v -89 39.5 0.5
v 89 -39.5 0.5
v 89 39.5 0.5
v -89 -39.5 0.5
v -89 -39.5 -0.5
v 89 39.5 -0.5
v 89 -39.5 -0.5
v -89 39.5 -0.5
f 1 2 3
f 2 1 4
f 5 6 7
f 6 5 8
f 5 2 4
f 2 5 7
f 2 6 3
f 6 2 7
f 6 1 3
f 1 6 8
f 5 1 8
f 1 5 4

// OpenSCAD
// -*-C-*-
// Modules for various hardware connectors.
//
// Copyright 2013, Brian Davis
//
// License: LGPL 2.1 or later

$fn=0;
$fa=0.01;
$fs=0.9;

/*
 * Perforated, galvanized thin angle; available from Home Depot.
 */
module galvanized_angle_1(length=180, odd_holes=true) {
  color("gray")
  difference() {
    union() {
      translate([0, 0, -15.5])
        cube([32, length, 1], center=true);
      translate([-15.5, 0, 0])
        cube([1, length, 32], center=true);
    }
    union() {
      for (y_offset = [0 : 25.5 : length / 2]) {
        for (y_mult = [-1 : 2 : 1]) {
          if (odd_holes) {
            // Odd number of perforations, with one hole
            // centered at 0.
            translate([0, y_mult * y_offset, -15.5])
              cylinder(r=5, h=1.5, center=true);
            translate([-15.5, y_mult * y_offset, 0])
              rotate([0, 90, 0])
                cylinder(r=5, h=1.5, center=true);
          }
          else {
            // Even number of perforations, with 0 point
            // centered between 2 holes.
            translate([0, (y_mult * y_offset) + 12.25, -15.5])
              cylinder(r=5, h=1.5, center=true);
            translate([-15.5, (y_mult * y_offset) + 12.25, 0])
              rotate([0, 90, 0])
                cylinder(r=5, h=1.5, center=true);
          }
        }
      }
      if (!odd_holes) {
        // Add an extra hole in the -y direction.
        translate([0, (-length / 2) + 12.25, -15.5])
          cylinder(r=5, h=1.5, center=true);
        translate([-15.5, (-length / 2) + 12.25, 0])
          rotate([0, 90, 0])
            cylinder(r=5, h=1.5, center=true);
      }
    }
  }
}

/*
 * Generally used for square wooden posts; available from
 * Home Depot.
 */
module galvanized_connector_1() {
  color("gray")
  difference() {
    union() {
      translate([0, 0, 29.25])
        cube([93, 83, 1.5], center=true);
      for (x_mult = [-1 : 2 : 1]) {
        translate([x_mult * 46.5, 0, 0])
          cube([1.5, 83, 60], center=true);
      }
    }
    union() {
      translate([0, 0, 29.25])
        cylinder(r=7.25, h=1.7, center=true);
      for (x_mult = [-1 : 2 : 1]) {
        for (y_mult = [-1 : 2 : 1]) {
          translate([x_mult * 22.5, y_mult * 22.5, 29.25])
            cylinder(r=2.5, h=1.7, center=true);
          translate([x_mult * 46.5, y_mult * 22.5, -22])
            rotate([0, 90, 0])
              cylinder(r=2.5, h=1.7, center=true);
        }
        translate([x_mult * 46.5, 0, -10])
          rotate([0, 90, 0])
            cylinder(r=7.25, h=1.7, center=true);
        translate([x_mult * 46.5, 0, 8])
          rotate([0, 90, 0])
            cylinder(r=2.5, h=1.7, center=true);
      }
    }
  }
}

/*
 * Generally used for square wooden posts; available from
 * Home Depot.
 */
module galvanized_connector_2() {
  color("gray")
  difference() {
    union() {
      translate([0, 0, 45])
        cube([94, 40, 2], center=true);
      for (x_mult = [-1 : 2 : 1]) {
        translate([x_mult * 46.25, 0, 0])
          cube([1.5, 40, 90], center=true);
        translate([x_mult * 64.5, 0, -45])
          linear_extrude(height=2)
            polygon(points=[[x_mult * -17.5,20],[x_mult * 3.5,20],
                            [x_mult * 17.5,4.5],[x_mult * 17.5,-4.5],
                            [x_mult * 3.5,-20],[x_mult * -17.5,-20]],
                    paths=[[0,1,2,3,4,5]]);      
      }
    }
    union() {
      translate([0, 0, 45])
        cylinder(r=2, h=2.1, center=true);
      for (x_mult = [-1 : 2 : 1]) {
        translate([x_mult * 70.5, 0, -44])
          cylinder(r=5.5, h=2.1, center=true);
        translate([x_mult * 47.25, x_mult * -8.25, 17.25])
          rotate([0, 90, 0])
            cylinder(r=2, h=2.1, center=true);
        translate([x_mult * 47.25, x_mult * 10.25, -7.75])
          rotate([0, 90, 0])
            cylinder(r=2, h=2.1, center=true);
      }
    }
  }
}

/*
 * Used for 2" electrical conduit; available from Home Depot.
 */
module 2_inch_half_u_strap() {
  color("gray")
  translate([0, 20.25, -29.25])
    union() {
      translate([0, 0, 25])
        rotate([0, 270, 0])
          difference() {
            cylinder(r=33.5, h=28, center=true);
            union() {
              cylinder(r=30.75, h=28.2, center=true);
              translate([-20, 0, 0])
                cube([35, 70, 28.2], center=true);
            }
          }
      translate([0, -32.125, 12])
        cube([28, 3, 24], center=true);
      translate([0, -45.125, 1.5])
        difference() {
          cube([28, 29, 3], center=true);
          translate([0, -5, 0])
            cylinder(r=6, h=3.2, center=true);
        }
      translate([0, -60, 1.5])
        difference() {
          cylinder(r=14, h=3, center=true);
          translate([0, 16, 0])
            cube([30, 30, 3.2], center=true);
        }
      translate([-14, 30.625, 23])
        rotate([270, 0, 0])
          linear_extrude(height=3)
            polygon(points=[[0,0],[7,7],
                            [21,7],[28,0]],
                    paths=[[0,1,2,3]]);      
    }
}

/*
 * Thin strap designed for EMT conduit.
 * Halex product 96161; available from Home Depot.
 */
module half_inch_2_hole_strap() {
  color("gray")
  translate([0, 0, -1.25])
    union() {
      // Loop that goes over or under the conduit.
      rotate([0, 270, 0])
        difference() {
          cylinder(r=10.5, h=12.5, center=true);
          union() {
            cylinder(r=9, h=13, center=true);
            translate([-6, 0, 0])
              cube([12, 25, 13], center=true);
          }
        }
      // Attachment points
      for (y_mult = [-1 : 2 : 1]) {
        translate([0, y_mult * 9.75, -4])
          cube([12.5, 1.5, 8], center=true);
        translate([0, y_mult * 16.5, -7.625])
          difference() {
            cube([12.5, 12, 0.75], center=true);
            translate([0, y_mult * 3.5, 0])
              cylinder(r=2.5, h=1.25, center=true);
          }
        translate([0, y_mult * 24, -7.625])
          rotate([0, 0, 90 - (y_mult * 90)])
            translate([-6.5, -1.5, -0.375])
              linear_extrude(height=0.75)
                polygon(points=[[0,0],[3,3],
                                [10,3],[13,0]],
                        paths=[[0,1,2,3]]);      
      }
    }
}

/*
 * Another connector designed for electrical conduit and
 * available from Home Depot.
 */
module 2_inch_plastic_u_strap() {
  color("gray")
  union() {
    // Loop that goes over or under the conduit.
    rotate([90, 0, 0])
      difference() {
        union() {
          cylinder(r=33, h=19, center=true);
          translate([0, -16, 0])
            cube([66, 34, 19], center=true);
        }
        union() {
          cylinder(r=30, h=20, center=true);
          translate([0, -19, 0])
            cube([60, 34, 20], center=true);
        }
      }
    // Attachment points
    for (x_mult = [-1 : 2 : 1]) {
      translate([x_mult * 38.9, 0, -31])
        rotate([0, 90 - (x_mult * 90), 0])
          difference() {
            union() {
              cube([10, 19, 4], center=true);
              translate([-1.5, 0, 0])
                cylinder(r=11.5, h=4, center=true);
            }
            union() {
              translate([3, 0, 0])
                cylinder(r=4, h=4.5, center=true);
              for (y_mult = [-1 : 2 : 1]) {
                translate([0, y_mult * 14.5, 0])
                  cube([12, 10, 4.5], center=true);
              }
              translate([-10.9, 0, 0])
                cube([10, 25, 4.5], center=true);
            }
          }
    }
  }
}

/*
 * Yet another connector designed for electrical conduit and
 * available from Home Depot.
 */
module 2_and_half_inch_metal_u_strap() {
  color("gray")
  union() {
    // Loop that goes over or under the conduit.
    rotate([90, 0, 0])
      difference() {
        union() {
          cylinder(r=37.5, h=25.5, center=true);
          translate([0, -15, 0])
            cube([75, 35, 25.5], center=true);
        }
        union() {
          cylinder(r=36.75, h=27, center=true);
          translate([0, -20, 0])
            cube([73.5, 36, 27], center=true);
        }
      }
    // Attachment points
    for (x_mult = [-1 : 2 : 1]) {
      translate([x_mult * 52.75, 0, -31.75])
        difference() {
          cube([32, 25.5, 1.5], center=true);
          translate([x_mult * 8, 0, 0])
            cylinder(r=5, h=3, center=true);
        }
      translate([x_mult * 68.5, 0, -31.75])
        hull() {
          cube([0.5, 25.5, 1.5], center=true);
          translate([3, 0, 0])
            cube([0.5, 20, 1.5], center=true);
        }
    }
  }
}

/*
 * Generic piece of angle aluminum which can be ordered
 * in various sizes from e.g. onlinemetals.com.
 */
module angle_aluminum(width=152.5,
                      height=101.5,
                      length=305,
                      thickness=6.35) {
  color("gray")
  union() {
    translate([0, 0, -height / 2])
      cube([width, length, thickness], center=true);
    translate([(width / 2) - (thickness / 2), 0, 0])
      cube([thickness, length, height], center=true);
  }
}

/*
 * U-bolt for securing 2" PVC pipe available from Home Depot.
 */
module 2_inch_u_bolt() {
  color("gray")
  union() {
    difference() {
      rotate_extrude(convexity=10)
        translate([36, 0, 0])
          circle(r=3.5, $fn=50);
      translate([0, -50, 0])
        cube([100, 100, 20], center=true);
    }
    for (x_mult = [-1 : 2 : 1]) {
      translate([x_mult * 36, -27.5, 0])
        rotate([90, 0, 0])
          cylinder(r=3.5, h=55, center=true);
    }
  }
}

/*
 * Plate for 2" U-bolt available from Home Depot.
 */
module 2_inch_u_bolt_plate() {
  color("gray")
  difference() {
    union() {
      cube([89, 16, 2], center=true);
    }
    union() {
      for (x_mult = [-1 : 2 : 1]) {
        translate([x_mult * 34, 0, 0])
          cylinder(r=3.75, h=2.5, center=true);
        translate([x_mult * 38, 0, 0])
          cylinder(r=3.75, h=2.5, center=true);
        translate([x_mult * 36, 0, 0])
          cube([5, 7.5, 2.5], center=true);
      }
    }
  }
}

module 4_inch_corner_brace_leg() {
  color("silver")
  difference() {
    cube([22.5, 3, 101], center=true);
    union() {
      translate([0, 0, 41.5])
        rotate([90, 0, 0])
          cylinder(r=4, h=4, center=true);
      translate([0, 0, -24.5])
        rotate([90, 0, 0])
          cylinder(r=4, h=4, center=true);
    }
  }
}

/*
 * 4 inch corner brace available from Home Depot.
 */
module 4_inch_corner_brace() {
  translate([0, -49, 0])
    4_inch_corner_brace_leg();
  translate([0, 0, -49])
    rotate([270, 0, 0])
      4_inch_corner_brace_leg();
}

/*
 * Tie-plate available from Home Depot.
 * NOTE: holes not modeled.
 */
module tie_plate() {
  color("gray")
  cube([178, 79, 1], center=true);
}

// Test renders.

*galvanized_angle_1(length=200, odd_holes=false);

*galvanized_connector_1();

*galvanized_connector_2();

*2_inch_half_u_strap();

*half_inch_2_hole_strap();

*2_inch_plastic_u_strap();

*2_and_half_inch_metal_u_strap();

*angle_aluminum();

*2_inch_u_bolt();

*2_inch_u_bolt_plate();

*4_inch_corner_brace();

tie_plate();
